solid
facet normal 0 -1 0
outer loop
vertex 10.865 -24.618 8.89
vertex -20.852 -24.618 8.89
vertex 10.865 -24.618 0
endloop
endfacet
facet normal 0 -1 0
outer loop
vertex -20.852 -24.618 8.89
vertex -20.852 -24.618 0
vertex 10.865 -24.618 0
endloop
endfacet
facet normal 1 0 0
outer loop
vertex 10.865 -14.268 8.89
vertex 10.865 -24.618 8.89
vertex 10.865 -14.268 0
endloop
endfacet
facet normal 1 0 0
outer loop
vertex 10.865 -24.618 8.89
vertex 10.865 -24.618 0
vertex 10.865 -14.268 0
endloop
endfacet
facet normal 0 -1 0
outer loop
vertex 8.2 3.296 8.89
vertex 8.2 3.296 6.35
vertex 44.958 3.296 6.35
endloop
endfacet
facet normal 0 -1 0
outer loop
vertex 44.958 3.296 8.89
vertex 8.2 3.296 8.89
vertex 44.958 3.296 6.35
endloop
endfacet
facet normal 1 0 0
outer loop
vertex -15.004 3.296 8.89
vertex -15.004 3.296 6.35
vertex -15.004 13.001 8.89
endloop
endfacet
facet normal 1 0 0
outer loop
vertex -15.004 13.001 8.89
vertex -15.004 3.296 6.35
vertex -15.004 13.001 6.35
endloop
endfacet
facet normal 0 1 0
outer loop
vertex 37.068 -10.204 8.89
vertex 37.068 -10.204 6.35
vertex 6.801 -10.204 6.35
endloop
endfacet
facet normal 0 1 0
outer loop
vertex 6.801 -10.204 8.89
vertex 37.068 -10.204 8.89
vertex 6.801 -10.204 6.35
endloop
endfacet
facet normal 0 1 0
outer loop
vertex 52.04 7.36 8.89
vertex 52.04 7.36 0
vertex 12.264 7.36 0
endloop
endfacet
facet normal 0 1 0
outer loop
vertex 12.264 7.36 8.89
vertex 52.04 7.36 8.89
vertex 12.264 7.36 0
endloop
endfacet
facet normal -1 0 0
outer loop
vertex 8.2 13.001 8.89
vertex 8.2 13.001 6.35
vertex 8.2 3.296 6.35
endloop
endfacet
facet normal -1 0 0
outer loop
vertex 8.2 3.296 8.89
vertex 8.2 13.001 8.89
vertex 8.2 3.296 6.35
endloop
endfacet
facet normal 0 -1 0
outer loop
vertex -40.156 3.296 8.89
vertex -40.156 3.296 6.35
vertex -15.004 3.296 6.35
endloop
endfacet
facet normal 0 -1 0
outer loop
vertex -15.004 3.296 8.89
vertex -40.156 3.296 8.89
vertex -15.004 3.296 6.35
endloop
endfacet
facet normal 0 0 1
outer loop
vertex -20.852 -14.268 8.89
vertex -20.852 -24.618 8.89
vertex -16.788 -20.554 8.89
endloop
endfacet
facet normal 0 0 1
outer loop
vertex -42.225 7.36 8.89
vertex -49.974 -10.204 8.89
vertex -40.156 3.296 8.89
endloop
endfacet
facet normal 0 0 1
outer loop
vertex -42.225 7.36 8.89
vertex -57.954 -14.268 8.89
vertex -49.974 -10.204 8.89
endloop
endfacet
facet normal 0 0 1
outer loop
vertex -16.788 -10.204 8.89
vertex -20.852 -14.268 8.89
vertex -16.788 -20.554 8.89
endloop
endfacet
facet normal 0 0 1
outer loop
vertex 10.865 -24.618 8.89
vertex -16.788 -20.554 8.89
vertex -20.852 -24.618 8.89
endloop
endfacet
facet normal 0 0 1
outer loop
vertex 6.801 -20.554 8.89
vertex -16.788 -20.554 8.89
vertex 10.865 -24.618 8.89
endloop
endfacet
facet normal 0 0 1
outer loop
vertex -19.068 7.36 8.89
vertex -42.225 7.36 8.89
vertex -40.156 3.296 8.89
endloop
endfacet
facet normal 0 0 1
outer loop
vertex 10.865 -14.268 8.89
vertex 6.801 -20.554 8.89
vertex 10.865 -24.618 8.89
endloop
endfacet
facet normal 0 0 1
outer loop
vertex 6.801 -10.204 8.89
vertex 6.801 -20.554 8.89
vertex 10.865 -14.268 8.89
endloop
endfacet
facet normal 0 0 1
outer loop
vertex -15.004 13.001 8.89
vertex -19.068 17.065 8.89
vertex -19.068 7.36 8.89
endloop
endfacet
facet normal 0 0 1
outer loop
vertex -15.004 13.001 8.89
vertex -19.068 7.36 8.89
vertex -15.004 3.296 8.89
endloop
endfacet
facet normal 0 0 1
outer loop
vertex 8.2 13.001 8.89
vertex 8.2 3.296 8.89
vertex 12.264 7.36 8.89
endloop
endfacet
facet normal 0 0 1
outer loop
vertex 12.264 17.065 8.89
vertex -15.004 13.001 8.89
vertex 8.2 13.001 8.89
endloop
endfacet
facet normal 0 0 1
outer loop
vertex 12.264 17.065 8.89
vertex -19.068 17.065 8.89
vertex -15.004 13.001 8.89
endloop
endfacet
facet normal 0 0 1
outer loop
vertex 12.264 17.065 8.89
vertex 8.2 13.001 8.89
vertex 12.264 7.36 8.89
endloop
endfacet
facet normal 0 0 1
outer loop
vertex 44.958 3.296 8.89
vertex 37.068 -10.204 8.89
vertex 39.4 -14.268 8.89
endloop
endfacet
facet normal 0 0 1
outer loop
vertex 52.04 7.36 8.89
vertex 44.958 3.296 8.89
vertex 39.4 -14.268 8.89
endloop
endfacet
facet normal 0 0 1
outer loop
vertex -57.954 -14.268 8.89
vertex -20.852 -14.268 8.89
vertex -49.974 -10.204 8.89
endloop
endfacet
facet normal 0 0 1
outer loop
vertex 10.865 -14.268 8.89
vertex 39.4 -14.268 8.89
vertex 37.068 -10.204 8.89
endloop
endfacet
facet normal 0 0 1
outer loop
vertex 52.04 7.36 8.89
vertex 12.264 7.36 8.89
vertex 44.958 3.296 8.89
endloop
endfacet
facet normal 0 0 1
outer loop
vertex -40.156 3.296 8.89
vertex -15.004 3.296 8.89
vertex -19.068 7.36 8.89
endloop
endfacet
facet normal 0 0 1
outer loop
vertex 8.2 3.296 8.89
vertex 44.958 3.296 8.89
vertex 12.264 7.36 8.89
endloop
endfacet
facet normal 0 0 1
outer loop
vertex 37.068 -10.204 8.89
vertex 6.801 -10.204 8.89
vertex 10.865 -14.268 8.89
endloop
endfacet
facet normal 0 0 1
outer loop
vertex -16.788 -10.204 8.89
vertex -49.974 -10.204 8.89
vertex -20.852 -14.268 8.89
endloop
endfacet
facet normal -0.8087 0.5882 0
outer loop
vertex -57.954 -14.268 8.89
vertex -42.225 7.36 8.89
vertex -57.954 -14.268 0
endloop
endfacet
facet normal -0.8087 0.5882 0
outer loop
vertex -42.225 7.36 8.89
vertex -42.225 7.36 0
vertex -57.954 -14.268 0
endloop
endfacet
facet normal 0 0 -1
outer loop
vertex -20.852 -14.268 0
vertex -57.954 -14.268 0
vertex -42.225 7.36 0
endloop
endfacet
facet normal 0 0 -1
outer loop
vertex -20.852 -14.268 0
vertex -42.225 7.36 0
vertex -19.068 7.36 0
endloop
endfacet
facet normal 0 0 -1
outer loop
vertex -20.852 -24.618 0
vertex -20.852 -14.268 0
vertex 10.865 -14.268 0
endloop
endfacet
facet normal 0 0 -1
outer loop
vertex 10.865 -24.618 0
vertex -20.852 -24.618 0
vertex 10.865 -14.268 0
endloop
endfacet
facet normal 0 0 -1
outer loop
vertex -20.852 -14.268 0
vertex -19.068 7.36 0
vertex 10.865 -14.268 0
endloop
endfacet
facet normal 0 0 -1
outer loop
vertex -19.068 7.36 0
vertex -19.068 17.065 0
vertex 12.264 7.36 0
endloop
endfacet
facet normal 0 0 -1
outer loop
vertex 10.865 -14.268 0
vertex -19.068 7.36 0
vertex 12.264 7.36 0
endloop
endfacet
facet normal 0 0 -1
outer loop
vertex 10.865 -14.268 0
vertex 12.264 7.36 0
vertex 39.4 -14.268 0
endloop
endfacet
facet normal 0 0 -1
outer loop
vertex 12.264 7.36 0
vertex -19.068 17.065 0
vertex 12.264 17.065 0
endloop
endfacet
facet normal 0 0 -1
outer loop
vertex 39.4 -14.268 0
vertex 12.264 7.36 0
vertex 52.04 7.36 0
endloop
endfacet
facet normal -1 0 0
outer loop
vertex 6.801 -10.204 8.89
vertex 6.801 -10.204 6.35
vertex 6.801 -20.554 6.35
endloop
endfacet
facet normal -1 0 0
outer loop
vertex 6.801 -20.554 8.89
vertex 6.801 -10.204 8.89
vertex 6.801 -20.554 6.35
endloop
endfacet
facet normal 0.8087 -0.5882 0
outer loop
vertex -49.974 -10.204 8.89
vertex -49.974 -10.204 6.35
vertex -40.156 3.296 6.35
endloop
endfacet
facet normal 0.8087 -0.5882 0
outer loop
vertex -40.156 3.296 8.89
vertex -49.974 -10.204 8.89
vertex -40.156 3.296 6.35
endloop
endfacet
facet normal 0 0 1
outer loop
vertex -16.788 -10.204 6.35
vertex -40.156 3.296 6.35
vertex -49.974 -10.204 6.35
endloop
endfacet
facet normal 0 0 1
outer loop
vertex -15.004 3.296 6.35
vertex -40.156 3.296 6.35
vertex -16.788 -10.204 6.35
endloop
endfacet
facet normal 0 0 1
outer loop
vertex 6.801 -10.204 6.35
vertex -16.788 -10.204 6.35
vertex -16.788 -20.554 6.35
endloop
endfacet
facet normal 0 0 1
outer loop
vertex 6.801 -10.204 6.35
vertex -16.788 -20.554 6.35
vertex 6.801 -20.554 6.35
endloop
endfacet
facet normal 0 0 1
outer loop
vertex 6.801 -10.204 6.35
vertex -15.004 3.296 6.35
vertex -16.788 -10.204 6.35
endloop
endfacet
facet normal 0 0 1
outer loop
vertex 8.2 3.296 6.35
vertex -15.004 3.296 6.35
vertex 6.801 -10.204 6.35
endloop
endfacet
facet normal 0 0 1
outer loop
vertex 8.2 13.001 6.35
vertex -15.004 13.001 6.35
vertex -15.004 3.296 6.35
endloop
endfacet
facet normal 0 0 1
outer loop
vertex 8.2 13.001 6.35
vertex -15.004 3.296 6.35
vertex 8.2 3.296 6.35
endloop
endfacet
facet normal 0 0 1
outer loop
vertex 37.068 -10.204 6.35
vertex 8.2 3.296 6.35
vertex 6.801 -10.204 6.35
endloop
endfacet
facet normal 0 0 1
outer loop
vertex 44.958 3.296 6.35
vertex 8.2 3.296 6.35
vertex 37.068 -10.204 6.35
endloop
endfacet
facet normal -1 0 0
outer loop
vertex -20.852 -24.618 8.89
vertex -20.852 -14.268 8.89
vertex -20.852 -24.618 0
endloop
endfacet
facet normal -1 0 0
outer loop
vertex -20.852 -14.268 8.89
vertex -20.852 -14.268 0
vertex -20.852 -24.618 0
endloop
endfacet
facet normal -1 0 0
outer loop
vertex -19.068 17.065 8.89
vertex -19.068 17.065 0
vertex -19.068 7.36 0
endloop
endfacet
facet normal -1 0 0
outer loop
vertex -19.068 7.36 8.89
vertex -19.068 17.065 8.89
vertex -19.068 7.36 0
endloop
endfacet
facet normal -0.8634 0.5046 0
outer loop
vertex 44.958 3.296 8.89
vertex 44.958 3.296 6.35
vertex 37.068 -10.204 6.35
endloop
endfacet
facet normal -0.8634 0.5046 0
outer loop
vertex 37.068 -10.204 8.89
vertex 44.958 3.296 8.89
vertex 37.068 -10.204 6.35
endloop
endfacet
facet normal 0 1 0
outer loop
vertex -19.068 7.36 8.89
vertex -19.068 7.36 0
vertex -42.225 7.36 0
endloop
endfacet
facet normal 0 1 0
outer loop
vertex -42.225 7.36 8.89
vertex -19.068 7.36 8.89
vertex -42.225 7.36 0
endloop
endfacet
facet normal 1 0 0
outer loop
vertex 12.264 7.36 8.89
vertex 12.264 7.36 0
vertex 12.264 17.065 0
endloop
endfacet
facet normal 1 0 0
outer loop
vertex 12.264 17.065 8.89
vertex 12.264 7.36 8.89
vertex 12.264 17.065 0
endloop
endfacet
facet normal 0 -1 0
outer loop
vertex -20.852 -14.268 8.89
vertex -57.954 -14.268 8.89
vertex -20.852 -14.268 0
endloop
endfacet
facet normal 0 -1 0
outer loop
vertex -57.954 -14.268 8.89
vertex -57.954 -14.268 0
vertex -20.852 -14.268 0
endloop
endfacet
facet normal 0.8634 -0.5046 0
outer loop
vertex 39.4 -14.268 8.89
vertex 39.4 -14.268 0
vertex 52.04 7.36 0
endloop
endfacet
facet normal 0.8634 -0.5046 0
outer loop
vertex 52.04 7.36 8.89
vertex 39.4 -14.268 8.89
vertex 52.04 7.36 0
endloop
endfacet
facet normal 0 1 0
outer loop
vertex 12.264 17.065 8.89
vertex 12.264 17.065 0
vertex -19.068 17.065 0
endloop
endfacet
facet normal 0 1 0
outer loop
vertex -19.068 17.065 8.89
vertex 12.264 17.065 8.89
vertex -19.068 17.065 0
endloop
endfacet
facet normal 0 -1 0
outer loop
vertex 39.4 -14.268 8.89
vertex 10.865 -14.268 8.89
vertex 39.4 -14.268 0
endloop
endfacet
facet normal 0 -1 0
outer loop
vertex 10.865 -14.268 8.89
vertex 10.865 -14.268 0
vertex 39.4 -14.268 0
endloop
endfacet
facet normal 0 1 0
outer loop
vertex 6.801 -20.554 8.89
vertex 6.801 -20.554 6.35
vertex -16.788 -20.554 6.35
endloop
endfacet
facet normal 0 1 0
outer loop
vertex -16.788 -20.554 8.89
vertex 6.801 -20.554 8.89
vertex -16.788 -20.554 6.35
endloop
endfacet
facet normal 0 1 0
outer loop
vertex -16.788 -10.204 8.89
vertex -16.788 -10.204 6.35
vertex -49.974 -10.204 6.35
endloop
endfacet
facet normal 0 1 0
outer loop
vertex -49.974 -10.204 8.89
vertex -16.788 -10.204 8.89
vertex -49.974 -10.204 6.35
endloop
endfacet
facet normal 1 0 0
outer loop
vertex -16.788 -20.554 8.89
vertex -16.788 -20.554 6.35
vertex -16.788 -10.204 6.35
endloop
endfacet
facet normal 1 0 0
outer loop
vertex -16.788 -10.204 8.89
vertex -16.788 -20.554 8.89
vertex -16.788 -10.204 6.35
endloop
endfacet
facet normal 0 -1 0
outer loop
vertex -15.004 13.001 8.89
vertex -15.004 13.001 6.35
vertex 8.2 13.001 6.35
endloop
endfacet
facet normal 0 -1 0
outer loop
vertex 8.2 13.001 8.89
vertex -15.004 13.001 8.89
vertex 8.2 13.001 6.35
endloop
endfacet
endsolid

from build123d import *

# Parameters (mm, degrees)
F1_DEPTH = 6.35
F3_DEPTH = 2.54


with BuildPart() as f1:
    # F0 (on Top) → F1 (new body)
    with BuildSketch(Plane.XY):
        Polygon((-19.068402, 7.360227), (-42.225117, 7.360227), (-57.954384, -14.267517), (-20.852379, -14.267517), (-20.852379, -24.618464), (10.865408, -24.618464), (10.865408, -14.267517), (39.400437, -14.267517), (52.040033, 7.360227), (12.264185, 7.360227), (12.264185, 17.065071), (-19.068402, 17.065071), align=None)
    extrude(amount=F1_DEPTH)

    # F2 (on face) → F3 (join)
    with BuildSketch(Plane.XY.offset(6.35)):
        Polygon((-19.068402, 7.360227), (-42.225117, 7.360227), (-57.954384, -14.267517), (-20.852379, -14.267517), (-20.852379, -24.618464), (10.865408, -24.618464), (10.865408, -14.267517), (39.400437, -14.267517), (52.040033, 7.360227), (12.264185, 7.360227), (12.264185, 17.065071), (-19.068402, 17.065071), align=None)
        Polygon((-15.004402, 3.296227), (-15.004402, 13.001071), (8.200185, 13.001071), (8.200185, 3.296227), (44.957841, 3.296227), (37.068377, -10.203517), (6.801408, -10.203517), (6.801408, -20.554464), (-16.788379, -20.554464), (-16.788379, -10.203517), (-49.973623, -10.203517), (-40.155628, 3.296227), align=None, mode=Mode.SUBTRACT)
    extrude(amount=F3_DEPTH)


solid = f1.part
